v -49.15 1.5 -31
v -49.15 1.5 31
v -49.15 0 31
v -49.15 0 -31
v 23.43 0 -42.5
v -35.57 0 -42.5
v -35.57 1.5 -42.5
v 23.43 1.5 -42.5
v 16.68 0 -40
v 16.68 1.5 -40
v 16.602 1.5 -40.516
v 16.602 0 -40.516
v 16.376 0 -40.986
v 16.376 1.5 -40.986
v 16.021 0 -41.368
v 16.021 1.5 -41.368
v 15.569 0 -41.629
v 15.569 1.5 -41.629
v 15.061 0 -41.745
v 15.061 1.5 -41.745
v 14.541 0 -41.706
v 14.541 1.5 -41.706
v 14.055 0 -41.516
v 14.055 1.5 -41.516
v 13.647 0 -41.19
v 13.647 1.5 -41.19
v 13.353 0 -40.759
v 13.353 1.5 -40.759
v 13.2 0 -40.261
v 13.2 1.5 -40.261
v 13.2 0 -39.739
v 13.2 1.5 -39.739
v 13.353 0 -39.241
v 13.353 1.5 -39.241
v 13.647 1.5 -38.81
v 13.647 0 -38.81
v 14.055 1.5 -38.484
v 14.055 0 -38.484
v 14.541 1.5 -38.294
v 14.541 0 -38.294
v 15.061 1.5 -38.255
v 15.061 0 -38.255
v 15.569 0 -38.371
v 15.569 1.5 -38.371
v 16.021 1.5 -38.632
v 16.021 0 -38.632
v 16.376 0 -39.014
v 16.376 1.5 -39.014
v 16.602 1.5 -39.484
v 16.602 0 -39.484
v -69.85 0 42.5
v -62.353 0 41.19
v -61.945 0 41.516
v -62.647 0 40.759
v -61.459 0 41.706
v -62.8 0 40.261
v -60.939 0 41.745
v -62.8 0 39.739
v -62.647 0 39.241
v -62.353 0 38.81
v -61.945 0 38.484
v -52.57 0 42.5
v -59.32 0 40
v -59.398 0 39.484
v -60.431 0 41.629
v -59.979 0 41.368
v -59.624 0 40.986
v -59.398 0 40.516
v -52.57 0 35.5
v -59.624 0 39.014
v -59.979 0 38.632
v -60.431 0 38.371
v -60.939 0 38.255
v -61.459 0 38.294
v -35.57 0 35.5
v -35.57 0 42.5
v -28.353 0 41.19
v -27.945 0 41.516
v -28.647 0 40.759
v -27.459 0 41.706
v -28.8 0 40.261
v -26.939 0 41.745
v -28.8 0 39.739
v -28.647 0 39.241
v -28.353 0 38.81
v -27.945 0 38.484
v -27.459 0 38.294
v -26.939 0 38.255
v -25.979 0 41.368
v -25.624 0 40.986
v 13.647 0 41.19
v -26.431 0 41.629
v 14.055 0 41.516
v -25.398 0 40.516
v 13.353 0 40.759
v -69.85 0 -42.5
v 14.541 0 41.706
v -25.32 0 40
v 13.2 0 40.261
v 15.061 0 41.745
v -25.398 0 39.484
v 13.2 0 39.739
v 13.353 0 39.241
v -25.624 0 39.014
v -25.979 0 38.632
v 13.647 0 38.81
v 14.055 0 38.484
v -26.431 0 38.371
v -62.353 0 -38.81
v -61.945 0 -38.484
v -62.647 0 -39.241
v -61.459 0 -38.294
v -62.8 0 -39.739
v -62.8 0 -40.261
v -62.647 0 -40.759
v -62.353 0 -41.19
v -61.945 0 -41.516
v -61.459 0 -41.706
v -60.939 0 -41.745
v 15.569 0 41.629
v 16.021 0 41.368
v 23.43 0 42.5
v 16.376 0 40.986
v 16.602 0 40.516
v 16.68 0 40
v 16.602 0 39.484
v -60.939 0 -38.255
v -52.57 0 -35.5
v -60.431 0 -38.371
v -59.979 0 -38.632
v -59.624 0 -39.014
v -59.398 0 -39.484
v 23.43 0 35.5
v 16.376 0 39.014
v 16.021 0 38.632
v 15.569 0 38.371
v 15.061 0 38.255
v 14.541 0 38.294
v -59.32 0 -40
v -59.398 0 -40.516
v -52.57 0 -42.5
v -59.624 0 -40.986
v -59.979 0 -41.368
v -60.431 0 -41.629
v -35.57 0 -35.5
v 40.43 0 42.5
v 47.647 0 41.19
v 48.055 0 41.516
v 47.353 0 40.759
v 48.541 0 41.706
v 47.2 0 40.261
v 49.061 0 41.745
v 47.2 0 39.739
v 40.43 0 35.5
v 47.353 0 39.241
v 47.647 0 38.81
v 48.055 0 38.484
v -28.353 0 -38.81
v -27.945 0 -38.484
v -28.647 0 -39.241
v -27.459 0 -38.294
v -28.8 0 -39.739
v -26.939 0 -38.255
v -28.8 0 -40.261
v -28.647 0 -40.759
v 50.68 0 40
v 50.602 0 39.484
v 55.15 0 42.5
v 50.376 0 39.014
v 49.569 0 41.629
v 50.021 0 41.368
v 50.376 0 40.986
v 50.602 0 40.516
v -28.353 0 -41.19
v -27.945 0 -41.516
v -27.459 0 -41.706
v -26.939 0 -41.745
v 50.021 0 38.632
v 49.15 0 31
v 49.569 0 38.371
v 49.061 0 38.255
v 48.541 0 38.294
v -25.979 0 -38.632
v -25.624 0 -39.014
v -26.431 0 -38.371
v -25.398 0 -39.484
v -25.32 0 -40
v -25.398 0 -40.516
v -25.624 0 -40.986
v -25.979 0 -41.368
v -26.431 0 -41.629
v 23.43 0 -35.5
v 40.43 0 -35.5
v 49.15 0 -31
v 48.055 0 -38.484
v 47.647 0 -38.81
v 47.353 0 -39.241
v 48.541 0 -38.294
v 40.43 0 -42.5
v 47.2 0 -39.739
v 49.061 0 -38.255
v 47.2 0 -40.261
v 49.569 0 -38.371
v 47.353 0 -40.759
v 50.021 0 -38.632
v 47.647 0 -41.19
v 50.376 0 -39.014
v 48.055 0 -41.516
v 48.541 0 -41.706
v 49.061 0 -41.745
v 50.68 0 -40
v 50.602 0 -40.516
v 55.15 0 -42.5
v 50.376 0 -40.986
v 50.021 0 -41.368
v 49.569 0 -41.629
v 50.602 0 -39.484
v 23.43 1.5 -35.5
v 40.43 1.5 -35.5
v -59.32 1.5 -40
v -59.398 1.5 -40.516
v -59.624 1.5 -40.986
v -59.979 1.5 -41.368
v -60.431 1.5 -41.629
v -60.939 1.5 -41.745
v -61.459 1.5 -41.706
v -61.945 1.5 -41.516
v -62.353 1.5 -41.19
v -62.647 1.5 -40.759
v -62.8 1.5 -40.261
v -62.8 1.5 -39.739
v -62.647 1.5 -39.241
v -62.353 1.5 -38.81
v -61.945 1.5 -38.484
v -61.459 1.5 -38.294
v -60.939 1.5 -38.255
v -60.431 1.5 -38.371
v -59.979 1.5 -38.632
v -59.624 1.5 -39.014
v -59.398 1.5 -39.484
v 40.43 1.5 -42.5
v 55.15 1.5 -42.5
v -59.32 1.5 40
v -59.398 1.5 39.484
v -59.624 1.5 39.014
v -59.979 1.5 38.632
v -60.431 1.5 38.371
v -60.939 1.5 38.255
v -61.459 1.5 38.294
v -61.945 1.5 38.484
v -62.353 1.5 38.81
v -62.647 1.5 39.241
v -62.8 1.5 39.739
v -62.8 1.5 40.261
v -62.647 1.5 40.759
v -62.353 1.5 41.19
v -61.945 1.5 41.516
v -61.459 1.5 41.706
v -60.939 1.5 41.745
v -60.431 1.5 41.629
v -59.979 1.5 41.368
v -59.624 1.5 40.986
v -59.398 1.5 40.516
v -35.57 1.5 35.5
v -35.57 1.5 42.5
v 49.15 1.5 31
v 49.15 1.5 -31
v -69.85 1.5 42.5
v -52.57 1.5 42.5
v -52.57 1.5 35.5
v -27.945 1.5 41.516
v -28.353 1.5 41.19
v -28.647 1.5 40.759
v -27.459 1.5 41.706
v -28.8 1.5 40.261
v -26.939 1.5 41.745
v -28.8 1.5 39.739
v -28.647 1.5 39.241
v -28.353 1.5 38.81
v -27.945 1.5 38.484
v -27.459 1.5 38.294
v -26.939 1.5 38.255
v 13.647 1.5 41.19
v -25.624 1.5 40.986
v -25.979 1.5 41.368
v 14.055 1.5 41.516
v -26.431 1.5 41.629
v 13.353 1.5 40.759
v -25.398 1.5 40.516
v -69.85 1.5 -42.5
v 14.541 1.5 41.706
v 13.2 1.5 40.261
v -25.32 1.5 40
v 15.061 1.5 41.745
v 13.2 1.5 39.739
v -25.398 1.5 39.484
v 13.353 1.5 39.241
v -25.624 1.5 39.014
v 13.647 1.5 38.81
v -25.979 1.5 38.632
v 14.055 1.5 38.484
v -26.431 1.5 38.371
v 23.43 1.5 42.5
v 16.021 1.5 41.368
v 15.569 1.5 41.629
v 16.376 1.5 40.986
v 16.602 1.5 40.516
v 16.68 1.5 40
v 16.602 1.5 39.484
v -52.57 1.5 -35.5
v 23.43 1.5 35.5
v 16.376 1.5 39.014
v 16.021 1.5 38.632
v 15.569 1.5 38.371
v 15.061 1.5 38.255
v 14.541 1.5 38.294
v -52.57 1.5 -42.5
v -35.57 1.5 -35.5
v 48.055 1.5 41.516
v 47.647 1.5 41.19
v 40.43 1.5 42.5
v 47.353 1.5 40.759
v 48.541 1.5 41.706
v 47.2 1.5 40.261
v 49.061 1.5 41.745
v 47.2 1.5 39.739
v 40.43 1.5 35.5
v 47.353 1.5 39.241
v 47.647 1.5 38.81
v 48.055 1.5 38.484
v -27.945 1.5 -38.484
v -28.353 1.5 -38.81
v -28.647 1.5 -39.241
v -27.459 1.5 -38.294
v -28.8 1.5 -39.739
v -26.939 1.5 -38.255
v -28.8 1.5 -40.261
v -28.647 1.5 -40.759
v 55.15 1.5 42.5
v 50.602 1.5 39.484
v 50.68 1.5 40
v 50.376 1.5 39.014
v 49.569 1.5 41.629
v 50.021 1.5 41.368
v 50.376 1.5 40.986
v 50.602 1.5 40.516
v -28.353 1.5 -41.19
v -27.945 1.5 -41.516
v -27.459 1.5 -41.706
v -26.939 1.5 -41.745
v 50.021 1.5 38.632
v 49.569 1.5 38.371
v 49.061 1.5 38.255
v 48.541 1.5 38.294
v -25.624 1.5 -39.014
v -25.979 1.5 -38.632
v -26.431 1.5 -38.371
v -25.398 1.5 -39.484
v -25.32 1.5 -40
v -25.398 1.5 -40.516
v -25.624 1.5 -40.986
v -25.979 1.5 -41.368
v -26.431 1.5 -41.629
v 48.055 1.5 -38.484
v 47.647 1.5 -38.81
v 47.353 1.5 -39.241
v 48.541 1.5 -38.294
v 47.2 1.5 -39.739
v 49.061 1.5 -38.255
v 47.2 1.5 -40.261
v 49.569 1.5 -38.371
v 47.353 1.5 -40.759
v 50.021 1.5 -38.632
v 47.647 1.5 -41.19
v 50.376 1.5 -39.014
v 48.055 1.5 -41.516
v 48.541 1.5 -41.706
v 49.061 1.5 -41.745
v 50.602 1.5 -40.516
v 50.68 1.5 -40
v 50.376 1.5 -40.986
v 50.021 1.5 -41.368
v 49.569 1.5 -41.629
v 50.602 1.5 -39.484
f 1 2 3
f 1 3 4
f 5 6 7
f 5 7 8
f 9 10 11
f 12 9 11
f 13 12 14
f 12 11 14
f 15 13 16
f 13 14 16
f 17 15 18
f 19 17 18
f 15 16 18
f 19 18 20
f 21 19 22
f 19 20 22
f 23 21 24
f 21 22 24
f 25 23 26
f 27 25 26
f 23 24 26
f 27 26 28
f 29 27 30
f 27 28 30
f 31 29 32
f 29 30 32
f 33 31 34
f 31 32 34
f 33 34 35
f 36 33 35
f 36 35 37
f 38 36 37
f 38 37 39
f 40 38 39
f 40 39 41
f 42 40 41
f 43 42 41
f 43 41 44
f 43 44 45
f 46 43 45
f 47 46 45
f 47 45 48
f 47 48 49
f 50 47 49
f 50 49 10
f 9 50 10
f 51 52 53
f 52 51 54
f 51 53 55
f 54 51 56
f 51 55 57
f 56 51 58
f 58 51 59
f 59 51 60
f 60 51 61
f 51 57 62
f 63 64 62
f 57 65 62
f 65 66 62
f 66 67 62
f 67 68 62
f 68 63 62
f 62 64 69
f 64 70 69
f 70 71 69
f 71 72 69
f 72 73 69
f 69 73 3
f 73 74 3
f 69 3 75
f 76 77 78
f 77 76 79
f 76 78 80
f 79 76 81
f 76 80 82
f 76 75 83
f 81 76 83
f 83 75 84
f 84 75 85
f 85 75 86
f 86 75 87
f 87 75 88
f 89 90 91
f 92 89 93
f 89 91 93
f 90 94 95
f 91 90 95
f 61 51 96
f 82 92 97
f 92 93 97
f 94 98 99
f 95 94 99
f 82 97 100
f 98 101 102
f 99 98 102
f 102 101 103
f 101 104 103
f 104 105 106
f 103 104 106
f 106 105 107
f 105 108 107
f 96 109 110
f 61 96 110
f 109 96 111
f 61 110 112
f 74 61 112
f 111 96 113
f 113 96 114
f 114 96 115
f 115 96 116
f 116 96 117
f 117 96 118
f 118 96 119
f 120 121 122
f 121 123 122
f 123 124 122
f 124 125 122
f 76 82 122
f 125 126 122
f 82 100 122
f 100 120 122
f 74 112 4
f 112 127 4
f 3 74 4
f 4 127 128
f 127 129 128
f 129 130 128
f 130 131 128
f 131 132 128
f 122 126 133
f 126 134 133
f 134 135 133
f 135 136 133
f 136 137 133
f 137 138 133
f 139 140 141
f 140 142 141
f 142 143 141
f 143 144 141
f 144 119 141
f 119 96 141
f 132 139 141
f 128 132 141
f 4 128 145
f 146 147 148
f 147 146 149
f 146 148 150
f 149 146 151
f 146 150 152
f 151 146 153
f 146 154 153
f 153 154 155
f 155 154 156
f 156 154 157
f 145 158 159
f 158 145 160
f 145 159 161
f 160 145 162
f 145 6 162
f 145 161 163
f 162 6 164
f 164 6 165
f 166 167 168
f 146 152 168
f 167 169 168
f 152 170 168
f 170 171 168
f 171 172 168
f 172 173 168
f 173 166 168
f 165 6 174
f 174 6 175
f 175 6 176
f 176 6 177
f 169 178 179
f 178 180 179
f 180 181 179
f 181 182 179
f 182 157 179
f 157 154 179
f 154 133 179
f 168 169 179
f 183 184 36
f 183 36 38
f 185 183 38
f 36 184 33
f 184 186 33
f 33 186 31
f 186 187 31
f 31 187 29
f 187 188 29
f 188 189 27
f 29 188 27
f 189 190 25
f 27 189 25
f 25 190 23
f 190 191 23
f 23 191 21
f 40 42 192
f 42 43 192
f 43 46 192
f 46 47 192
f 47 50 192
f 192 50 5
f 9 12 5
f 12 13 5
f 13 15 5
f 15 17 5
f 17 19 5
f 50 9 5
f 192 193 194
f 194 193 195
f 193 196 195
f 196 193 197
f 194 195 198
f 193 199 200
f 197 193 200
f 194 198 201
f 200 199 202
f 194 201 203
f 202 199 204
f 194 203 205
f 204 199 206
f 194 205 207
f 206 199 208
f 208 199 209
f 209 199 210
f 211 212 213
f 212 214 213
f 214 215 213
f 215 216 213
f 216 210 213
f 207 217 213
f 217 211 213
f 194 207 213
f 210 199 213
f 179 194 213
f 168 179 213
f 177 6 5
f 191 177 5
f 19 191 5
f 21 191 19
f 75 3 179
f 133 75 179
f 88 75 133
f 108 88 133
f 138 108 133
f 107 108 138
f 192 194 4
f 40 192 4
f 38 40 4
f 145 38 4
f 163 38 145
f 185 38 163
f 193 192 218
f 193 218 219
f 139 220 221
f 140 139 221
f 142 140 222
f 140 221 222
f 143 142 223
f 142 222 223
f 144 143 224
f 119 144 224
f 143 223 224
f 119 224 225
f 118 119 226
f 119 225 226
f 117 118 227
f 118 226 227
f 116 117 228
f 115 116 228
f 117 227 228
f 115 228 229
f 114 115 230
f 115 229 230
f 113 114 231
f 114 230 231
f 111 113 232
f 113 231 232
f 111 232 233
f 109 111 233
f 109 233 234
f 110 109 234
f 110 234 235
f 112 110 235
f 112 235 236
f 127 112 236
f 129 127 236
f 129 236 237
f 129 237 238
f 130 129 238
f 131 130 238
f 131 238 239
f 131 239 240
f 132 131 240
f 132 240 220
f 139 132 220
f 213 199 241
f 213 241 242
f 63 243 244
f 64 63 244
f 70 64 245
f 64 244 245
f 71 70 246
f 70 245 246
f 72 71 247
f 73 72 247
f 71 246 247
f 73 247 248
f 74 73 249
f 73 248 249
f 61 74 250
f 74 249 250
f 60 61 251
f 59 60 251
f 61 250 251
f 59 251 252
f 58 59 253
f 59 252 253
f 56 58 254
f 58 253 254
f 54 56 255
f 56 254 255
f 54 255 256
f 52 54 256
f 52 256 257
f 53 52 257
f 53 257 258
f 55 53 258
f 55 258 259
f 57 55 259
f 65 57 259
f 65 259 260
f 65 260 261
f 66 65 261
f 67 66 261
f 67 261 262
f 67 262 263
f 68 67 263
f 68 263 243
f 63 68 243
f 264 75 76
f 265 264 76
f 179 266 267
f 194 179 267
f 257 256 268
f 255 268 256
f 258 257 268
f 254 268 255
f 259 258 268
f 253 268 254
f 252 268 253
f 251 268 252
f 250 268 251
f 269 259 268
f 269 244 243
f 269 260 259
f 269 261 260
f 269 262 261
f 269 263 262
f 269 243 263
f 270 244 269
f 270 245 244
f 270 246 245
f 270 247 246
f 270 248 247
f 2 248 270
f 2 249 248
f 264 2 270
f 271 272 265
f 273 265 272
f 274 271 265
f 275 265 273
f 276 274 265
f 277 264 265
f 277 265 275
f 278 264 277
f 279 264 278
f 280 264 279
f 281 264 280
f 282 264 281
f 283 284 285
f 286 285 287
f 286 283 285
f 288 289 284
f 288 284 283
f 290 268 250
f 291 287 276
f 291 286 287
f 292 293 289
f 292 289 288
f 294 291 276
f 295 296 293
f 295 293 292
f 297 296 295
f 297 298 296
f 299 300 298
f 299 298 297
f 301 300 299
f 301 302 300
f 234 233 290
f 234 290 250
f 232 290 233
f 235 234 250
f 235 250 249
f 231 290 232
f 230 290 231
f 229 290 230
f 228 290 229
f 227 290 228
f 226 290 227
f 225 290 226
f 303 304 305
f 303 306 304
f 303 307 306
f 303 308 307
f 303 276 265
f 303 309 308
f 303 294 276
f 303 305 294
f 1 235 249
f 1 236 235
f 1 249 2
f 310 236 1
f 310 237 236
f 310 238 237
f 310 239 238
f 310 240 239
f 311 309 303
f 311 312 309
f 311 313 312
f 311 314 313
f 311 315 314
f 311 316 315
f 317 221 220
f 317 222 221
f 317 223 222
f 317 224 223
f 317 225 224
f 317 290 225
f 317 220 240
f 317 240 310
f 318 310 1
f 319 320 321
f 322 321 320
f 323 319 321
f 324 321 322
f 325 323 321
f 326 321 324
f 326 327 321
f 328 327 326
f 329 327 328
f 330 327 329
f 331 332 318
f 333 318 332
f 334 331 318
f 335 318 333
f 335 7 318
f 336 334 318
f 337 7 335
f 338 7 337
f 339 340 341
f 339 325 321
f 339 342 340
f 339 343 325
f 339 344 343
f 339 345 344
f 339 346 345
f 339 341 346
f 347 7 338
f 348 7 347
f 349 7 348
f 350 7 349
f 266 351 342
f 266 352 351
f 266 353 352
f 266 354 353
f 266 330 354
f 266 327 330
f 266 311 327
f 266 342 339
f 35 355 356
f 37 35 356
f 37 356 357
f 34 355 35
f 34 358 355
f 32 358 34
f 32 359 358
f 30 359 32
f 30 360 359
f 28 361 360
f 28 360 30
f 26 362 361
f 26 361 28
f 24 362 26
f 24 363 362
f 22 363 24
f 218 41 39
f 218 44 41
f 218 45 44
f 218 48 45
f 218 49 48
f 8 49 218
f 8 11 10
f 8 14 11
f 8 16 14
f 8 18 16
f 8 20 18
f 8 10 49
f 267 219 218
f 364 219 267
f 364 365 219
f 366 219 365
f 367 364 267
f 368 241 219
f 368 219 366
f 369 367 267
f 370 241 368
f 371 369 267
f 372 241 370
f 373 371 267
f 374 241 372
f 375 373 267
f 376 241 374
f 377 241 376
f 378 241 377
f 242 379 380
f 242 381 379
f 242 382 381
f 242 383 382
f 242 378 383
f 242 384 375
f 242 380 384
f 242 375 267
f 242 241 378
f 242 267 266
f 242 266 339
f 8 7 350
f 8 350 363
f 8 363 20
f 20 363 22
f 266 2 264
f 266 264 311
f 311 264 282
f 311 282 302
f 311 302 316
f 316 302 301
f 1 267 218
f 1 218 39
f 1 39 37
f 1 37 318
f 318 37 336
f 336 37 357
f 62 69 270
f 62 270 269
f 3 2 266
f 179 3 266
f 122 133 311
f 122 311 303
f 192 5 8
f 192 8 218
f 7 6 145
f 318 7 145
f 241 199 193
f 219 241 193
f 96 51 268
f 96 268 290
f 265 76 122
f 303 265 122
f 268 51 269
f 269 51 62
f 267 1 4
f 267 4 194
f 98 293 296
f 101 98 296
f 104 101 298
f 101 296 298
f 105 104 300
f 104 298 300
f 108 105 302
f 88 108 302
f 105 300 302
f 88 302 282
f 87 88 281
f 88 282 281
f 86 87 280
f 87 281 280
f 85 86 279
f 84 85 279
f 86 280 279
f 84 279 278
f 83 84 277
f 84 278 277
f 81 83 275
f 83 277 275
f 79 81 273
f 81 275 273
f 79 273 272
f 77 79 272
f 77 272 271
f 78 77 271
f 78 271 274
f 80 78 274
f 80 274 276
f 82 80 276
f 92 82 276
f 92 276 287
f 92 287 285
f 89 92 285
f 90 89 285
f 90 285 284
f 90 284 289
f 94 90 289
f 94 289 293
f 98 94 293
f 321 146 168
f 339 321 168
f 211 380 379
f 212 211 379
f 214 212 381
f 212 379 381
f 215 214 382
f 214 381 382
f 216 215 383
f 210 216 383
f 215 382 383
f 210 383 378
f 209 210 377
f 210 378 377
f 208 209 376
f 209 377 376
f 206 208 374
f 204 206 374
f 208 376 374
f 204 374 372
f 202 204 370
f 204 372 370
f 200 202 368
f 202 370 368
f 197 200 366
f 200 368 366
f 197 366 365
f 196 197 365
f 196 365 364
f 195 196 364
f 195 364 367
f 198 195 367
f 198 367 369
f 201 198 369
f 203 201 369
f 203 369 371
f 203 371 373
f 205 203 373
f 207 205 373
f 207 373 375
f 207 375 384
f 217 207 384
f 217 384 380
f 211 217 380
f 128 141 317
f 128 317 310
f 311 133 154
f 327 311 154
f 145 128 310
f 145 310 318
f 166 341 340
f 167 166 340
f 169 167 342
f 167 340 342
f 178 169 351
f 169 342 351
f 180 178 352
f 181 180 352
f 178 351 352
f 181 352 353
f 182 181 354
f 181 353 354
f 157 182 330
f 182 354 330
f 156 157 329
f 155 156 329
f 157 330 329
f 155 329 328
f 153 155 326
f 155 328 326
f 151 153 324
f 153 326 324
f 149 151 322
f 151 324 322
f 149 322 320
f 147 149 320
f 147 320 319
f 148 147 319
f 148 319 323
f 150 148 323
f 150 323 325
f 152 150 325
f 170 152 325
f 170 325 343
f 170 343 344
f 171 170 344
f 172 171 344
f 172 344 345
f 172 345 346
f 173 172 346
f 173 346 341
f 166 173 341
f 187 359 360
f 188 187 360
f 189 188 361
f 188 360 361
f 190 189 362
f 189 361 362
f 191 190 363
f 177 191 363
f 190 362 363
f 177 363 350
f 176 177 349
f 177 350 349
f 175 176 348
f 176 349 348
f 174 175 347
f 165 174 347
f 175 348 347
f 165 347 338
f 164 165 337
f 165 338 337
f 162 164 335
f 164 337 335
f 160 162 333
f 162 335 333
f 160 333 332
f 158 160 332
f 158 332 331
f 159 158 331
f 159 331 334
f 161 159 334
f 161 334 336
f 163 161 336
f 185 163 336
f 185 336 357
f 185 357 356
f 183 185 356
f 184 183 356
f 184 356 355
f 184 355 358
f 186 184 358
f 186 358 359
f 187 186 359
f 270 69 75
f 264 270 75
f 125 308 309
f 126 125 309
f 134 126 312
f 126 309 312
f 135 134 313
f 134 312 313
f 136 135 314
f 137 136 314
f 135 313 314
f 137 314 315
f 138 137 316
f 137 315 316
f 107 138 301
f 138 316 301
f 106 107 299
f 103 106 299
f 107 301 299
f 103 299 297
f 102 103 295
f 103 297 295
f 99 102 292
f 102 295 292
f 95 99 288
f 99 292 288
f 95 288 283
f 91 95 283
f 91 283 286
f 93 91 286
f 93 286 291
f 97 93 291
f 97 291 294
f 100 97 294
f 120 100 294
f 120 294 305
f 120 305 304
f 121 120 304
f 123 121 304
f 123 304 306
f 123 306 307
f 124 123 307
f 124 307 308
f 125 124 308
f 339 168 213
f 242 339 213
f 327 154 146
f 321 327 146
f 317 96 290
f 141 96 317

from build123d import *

# Parameters (mm, degrees)
SKETCH_1_W          = 125
SKETCH_1_H          = 85
EXTRUDE_1_DEPTH     = 1.5
SKETCH_2_W          = 98.3
SKETCH_2_H          = 62
CUT_EXTRUDE_1_DEPTH = 1.5
SKETCH_4_R          = 1.75
CUT_EXTRUDE_2_DEPTH = 10
SKETCH_5_R          = 1.75
CUT_EXTRUDE_3_DEPTH = 10
SKETCH_6_W          = 17
SKETCH_6_H          = 9
CUT_EXTRUDE_4_DEPTH = 10


with BuildPart() as part:
    # 스케치1 → 보스-돌출1 (new body)
    with BuildSketch(Plane(origin=(0, 0, 0), x_dir=(1, 0, 0), z_dir=(0, 1, 0))):
        with Locations((-7.35, 0)):
            Rectangle(SKETCH_1_W, SKETCH_1_H)
    extrude(amount=EXTRUDE_1_DEPTH)

    # 스케치2 → 컷-돌출1 (cut)
    with BuildSketch(Plane(origin=(0, 1.5, 0), x_dir=(1, 0, 0), z_dir=(0, 1, 0))):
        Rectangle(SKETCH_2_W, SKETCH_2_H)
    extrude(amount=-CUT_EXTRUDE_1_DEPTH, mode=Mode.SUBTRACT)

    # 스케치4 → 컷-돌출2 (cut)
    with BuildSketch(Plane(origin=(0, 1.5, 0), x_dir=(1, 0, 0), z_dir=(0, 1, 0))):
        with Locations((-61.07, 40)):
            Circle(SKETCH_4_R)
        with Locations((48.93, 40)):
            Circle(SKETCH_4_R)
        with Locations((48.93, -40)):
            Circle(SKETCH_4_R)
        with Locations((-61.07, -40)):
            Circle(SKETCH_4_R)
    extrude(amount=-CUT_EXTRUDE_2_DEPTH, mode=Mode.SUBTRACT)

    # 스케치5 → 컷-돌출3 (cut)
    with BuildSketch(Plane(origin=(0, 1.5, 0), x_dir=(1, 0, 0), z_dir=(0, 1, 0))):
        with Locations((-27.07, -40)):
            Circle(SKETCH_5_R)
        with Locations((14.93, -40)):
            Circle(SKETCH_5_R)
        with Locations((-27.07, 40)):
            Circle(SKETCH_5_R)
        with Locations((14.93, 40)):
            Circle(SKETCH_5_R)
    extrude(amount=-CUT_EXTRUDE_3_DEPTH, mode=Mode.SUBTRACT)

    # 스케치6 → 컷-돌출4 (cut)
    with BuildSketch(Plane.XZ):
        with Locations((-44.07, 40)):
            Rectangle(SKETCH_6_W, SKETCH_6_H)
        with Locations((31.93, 40)):
            Rectangle(SKETCH_6_W, SKETCH_6_H)
        with Locations((-44.07, -40)):
            Rectangle(SKETCH_6_W, SKETCH_6_H)
        with Locations((31.93, -40)):
            Rectangle(SKETCH_6_W, SKETCH_6_H)
    extrude(amount=-CUT_EXTRUDE_4_DEPTH, mode=Mode.SUBTRACT)


solid = part.part
